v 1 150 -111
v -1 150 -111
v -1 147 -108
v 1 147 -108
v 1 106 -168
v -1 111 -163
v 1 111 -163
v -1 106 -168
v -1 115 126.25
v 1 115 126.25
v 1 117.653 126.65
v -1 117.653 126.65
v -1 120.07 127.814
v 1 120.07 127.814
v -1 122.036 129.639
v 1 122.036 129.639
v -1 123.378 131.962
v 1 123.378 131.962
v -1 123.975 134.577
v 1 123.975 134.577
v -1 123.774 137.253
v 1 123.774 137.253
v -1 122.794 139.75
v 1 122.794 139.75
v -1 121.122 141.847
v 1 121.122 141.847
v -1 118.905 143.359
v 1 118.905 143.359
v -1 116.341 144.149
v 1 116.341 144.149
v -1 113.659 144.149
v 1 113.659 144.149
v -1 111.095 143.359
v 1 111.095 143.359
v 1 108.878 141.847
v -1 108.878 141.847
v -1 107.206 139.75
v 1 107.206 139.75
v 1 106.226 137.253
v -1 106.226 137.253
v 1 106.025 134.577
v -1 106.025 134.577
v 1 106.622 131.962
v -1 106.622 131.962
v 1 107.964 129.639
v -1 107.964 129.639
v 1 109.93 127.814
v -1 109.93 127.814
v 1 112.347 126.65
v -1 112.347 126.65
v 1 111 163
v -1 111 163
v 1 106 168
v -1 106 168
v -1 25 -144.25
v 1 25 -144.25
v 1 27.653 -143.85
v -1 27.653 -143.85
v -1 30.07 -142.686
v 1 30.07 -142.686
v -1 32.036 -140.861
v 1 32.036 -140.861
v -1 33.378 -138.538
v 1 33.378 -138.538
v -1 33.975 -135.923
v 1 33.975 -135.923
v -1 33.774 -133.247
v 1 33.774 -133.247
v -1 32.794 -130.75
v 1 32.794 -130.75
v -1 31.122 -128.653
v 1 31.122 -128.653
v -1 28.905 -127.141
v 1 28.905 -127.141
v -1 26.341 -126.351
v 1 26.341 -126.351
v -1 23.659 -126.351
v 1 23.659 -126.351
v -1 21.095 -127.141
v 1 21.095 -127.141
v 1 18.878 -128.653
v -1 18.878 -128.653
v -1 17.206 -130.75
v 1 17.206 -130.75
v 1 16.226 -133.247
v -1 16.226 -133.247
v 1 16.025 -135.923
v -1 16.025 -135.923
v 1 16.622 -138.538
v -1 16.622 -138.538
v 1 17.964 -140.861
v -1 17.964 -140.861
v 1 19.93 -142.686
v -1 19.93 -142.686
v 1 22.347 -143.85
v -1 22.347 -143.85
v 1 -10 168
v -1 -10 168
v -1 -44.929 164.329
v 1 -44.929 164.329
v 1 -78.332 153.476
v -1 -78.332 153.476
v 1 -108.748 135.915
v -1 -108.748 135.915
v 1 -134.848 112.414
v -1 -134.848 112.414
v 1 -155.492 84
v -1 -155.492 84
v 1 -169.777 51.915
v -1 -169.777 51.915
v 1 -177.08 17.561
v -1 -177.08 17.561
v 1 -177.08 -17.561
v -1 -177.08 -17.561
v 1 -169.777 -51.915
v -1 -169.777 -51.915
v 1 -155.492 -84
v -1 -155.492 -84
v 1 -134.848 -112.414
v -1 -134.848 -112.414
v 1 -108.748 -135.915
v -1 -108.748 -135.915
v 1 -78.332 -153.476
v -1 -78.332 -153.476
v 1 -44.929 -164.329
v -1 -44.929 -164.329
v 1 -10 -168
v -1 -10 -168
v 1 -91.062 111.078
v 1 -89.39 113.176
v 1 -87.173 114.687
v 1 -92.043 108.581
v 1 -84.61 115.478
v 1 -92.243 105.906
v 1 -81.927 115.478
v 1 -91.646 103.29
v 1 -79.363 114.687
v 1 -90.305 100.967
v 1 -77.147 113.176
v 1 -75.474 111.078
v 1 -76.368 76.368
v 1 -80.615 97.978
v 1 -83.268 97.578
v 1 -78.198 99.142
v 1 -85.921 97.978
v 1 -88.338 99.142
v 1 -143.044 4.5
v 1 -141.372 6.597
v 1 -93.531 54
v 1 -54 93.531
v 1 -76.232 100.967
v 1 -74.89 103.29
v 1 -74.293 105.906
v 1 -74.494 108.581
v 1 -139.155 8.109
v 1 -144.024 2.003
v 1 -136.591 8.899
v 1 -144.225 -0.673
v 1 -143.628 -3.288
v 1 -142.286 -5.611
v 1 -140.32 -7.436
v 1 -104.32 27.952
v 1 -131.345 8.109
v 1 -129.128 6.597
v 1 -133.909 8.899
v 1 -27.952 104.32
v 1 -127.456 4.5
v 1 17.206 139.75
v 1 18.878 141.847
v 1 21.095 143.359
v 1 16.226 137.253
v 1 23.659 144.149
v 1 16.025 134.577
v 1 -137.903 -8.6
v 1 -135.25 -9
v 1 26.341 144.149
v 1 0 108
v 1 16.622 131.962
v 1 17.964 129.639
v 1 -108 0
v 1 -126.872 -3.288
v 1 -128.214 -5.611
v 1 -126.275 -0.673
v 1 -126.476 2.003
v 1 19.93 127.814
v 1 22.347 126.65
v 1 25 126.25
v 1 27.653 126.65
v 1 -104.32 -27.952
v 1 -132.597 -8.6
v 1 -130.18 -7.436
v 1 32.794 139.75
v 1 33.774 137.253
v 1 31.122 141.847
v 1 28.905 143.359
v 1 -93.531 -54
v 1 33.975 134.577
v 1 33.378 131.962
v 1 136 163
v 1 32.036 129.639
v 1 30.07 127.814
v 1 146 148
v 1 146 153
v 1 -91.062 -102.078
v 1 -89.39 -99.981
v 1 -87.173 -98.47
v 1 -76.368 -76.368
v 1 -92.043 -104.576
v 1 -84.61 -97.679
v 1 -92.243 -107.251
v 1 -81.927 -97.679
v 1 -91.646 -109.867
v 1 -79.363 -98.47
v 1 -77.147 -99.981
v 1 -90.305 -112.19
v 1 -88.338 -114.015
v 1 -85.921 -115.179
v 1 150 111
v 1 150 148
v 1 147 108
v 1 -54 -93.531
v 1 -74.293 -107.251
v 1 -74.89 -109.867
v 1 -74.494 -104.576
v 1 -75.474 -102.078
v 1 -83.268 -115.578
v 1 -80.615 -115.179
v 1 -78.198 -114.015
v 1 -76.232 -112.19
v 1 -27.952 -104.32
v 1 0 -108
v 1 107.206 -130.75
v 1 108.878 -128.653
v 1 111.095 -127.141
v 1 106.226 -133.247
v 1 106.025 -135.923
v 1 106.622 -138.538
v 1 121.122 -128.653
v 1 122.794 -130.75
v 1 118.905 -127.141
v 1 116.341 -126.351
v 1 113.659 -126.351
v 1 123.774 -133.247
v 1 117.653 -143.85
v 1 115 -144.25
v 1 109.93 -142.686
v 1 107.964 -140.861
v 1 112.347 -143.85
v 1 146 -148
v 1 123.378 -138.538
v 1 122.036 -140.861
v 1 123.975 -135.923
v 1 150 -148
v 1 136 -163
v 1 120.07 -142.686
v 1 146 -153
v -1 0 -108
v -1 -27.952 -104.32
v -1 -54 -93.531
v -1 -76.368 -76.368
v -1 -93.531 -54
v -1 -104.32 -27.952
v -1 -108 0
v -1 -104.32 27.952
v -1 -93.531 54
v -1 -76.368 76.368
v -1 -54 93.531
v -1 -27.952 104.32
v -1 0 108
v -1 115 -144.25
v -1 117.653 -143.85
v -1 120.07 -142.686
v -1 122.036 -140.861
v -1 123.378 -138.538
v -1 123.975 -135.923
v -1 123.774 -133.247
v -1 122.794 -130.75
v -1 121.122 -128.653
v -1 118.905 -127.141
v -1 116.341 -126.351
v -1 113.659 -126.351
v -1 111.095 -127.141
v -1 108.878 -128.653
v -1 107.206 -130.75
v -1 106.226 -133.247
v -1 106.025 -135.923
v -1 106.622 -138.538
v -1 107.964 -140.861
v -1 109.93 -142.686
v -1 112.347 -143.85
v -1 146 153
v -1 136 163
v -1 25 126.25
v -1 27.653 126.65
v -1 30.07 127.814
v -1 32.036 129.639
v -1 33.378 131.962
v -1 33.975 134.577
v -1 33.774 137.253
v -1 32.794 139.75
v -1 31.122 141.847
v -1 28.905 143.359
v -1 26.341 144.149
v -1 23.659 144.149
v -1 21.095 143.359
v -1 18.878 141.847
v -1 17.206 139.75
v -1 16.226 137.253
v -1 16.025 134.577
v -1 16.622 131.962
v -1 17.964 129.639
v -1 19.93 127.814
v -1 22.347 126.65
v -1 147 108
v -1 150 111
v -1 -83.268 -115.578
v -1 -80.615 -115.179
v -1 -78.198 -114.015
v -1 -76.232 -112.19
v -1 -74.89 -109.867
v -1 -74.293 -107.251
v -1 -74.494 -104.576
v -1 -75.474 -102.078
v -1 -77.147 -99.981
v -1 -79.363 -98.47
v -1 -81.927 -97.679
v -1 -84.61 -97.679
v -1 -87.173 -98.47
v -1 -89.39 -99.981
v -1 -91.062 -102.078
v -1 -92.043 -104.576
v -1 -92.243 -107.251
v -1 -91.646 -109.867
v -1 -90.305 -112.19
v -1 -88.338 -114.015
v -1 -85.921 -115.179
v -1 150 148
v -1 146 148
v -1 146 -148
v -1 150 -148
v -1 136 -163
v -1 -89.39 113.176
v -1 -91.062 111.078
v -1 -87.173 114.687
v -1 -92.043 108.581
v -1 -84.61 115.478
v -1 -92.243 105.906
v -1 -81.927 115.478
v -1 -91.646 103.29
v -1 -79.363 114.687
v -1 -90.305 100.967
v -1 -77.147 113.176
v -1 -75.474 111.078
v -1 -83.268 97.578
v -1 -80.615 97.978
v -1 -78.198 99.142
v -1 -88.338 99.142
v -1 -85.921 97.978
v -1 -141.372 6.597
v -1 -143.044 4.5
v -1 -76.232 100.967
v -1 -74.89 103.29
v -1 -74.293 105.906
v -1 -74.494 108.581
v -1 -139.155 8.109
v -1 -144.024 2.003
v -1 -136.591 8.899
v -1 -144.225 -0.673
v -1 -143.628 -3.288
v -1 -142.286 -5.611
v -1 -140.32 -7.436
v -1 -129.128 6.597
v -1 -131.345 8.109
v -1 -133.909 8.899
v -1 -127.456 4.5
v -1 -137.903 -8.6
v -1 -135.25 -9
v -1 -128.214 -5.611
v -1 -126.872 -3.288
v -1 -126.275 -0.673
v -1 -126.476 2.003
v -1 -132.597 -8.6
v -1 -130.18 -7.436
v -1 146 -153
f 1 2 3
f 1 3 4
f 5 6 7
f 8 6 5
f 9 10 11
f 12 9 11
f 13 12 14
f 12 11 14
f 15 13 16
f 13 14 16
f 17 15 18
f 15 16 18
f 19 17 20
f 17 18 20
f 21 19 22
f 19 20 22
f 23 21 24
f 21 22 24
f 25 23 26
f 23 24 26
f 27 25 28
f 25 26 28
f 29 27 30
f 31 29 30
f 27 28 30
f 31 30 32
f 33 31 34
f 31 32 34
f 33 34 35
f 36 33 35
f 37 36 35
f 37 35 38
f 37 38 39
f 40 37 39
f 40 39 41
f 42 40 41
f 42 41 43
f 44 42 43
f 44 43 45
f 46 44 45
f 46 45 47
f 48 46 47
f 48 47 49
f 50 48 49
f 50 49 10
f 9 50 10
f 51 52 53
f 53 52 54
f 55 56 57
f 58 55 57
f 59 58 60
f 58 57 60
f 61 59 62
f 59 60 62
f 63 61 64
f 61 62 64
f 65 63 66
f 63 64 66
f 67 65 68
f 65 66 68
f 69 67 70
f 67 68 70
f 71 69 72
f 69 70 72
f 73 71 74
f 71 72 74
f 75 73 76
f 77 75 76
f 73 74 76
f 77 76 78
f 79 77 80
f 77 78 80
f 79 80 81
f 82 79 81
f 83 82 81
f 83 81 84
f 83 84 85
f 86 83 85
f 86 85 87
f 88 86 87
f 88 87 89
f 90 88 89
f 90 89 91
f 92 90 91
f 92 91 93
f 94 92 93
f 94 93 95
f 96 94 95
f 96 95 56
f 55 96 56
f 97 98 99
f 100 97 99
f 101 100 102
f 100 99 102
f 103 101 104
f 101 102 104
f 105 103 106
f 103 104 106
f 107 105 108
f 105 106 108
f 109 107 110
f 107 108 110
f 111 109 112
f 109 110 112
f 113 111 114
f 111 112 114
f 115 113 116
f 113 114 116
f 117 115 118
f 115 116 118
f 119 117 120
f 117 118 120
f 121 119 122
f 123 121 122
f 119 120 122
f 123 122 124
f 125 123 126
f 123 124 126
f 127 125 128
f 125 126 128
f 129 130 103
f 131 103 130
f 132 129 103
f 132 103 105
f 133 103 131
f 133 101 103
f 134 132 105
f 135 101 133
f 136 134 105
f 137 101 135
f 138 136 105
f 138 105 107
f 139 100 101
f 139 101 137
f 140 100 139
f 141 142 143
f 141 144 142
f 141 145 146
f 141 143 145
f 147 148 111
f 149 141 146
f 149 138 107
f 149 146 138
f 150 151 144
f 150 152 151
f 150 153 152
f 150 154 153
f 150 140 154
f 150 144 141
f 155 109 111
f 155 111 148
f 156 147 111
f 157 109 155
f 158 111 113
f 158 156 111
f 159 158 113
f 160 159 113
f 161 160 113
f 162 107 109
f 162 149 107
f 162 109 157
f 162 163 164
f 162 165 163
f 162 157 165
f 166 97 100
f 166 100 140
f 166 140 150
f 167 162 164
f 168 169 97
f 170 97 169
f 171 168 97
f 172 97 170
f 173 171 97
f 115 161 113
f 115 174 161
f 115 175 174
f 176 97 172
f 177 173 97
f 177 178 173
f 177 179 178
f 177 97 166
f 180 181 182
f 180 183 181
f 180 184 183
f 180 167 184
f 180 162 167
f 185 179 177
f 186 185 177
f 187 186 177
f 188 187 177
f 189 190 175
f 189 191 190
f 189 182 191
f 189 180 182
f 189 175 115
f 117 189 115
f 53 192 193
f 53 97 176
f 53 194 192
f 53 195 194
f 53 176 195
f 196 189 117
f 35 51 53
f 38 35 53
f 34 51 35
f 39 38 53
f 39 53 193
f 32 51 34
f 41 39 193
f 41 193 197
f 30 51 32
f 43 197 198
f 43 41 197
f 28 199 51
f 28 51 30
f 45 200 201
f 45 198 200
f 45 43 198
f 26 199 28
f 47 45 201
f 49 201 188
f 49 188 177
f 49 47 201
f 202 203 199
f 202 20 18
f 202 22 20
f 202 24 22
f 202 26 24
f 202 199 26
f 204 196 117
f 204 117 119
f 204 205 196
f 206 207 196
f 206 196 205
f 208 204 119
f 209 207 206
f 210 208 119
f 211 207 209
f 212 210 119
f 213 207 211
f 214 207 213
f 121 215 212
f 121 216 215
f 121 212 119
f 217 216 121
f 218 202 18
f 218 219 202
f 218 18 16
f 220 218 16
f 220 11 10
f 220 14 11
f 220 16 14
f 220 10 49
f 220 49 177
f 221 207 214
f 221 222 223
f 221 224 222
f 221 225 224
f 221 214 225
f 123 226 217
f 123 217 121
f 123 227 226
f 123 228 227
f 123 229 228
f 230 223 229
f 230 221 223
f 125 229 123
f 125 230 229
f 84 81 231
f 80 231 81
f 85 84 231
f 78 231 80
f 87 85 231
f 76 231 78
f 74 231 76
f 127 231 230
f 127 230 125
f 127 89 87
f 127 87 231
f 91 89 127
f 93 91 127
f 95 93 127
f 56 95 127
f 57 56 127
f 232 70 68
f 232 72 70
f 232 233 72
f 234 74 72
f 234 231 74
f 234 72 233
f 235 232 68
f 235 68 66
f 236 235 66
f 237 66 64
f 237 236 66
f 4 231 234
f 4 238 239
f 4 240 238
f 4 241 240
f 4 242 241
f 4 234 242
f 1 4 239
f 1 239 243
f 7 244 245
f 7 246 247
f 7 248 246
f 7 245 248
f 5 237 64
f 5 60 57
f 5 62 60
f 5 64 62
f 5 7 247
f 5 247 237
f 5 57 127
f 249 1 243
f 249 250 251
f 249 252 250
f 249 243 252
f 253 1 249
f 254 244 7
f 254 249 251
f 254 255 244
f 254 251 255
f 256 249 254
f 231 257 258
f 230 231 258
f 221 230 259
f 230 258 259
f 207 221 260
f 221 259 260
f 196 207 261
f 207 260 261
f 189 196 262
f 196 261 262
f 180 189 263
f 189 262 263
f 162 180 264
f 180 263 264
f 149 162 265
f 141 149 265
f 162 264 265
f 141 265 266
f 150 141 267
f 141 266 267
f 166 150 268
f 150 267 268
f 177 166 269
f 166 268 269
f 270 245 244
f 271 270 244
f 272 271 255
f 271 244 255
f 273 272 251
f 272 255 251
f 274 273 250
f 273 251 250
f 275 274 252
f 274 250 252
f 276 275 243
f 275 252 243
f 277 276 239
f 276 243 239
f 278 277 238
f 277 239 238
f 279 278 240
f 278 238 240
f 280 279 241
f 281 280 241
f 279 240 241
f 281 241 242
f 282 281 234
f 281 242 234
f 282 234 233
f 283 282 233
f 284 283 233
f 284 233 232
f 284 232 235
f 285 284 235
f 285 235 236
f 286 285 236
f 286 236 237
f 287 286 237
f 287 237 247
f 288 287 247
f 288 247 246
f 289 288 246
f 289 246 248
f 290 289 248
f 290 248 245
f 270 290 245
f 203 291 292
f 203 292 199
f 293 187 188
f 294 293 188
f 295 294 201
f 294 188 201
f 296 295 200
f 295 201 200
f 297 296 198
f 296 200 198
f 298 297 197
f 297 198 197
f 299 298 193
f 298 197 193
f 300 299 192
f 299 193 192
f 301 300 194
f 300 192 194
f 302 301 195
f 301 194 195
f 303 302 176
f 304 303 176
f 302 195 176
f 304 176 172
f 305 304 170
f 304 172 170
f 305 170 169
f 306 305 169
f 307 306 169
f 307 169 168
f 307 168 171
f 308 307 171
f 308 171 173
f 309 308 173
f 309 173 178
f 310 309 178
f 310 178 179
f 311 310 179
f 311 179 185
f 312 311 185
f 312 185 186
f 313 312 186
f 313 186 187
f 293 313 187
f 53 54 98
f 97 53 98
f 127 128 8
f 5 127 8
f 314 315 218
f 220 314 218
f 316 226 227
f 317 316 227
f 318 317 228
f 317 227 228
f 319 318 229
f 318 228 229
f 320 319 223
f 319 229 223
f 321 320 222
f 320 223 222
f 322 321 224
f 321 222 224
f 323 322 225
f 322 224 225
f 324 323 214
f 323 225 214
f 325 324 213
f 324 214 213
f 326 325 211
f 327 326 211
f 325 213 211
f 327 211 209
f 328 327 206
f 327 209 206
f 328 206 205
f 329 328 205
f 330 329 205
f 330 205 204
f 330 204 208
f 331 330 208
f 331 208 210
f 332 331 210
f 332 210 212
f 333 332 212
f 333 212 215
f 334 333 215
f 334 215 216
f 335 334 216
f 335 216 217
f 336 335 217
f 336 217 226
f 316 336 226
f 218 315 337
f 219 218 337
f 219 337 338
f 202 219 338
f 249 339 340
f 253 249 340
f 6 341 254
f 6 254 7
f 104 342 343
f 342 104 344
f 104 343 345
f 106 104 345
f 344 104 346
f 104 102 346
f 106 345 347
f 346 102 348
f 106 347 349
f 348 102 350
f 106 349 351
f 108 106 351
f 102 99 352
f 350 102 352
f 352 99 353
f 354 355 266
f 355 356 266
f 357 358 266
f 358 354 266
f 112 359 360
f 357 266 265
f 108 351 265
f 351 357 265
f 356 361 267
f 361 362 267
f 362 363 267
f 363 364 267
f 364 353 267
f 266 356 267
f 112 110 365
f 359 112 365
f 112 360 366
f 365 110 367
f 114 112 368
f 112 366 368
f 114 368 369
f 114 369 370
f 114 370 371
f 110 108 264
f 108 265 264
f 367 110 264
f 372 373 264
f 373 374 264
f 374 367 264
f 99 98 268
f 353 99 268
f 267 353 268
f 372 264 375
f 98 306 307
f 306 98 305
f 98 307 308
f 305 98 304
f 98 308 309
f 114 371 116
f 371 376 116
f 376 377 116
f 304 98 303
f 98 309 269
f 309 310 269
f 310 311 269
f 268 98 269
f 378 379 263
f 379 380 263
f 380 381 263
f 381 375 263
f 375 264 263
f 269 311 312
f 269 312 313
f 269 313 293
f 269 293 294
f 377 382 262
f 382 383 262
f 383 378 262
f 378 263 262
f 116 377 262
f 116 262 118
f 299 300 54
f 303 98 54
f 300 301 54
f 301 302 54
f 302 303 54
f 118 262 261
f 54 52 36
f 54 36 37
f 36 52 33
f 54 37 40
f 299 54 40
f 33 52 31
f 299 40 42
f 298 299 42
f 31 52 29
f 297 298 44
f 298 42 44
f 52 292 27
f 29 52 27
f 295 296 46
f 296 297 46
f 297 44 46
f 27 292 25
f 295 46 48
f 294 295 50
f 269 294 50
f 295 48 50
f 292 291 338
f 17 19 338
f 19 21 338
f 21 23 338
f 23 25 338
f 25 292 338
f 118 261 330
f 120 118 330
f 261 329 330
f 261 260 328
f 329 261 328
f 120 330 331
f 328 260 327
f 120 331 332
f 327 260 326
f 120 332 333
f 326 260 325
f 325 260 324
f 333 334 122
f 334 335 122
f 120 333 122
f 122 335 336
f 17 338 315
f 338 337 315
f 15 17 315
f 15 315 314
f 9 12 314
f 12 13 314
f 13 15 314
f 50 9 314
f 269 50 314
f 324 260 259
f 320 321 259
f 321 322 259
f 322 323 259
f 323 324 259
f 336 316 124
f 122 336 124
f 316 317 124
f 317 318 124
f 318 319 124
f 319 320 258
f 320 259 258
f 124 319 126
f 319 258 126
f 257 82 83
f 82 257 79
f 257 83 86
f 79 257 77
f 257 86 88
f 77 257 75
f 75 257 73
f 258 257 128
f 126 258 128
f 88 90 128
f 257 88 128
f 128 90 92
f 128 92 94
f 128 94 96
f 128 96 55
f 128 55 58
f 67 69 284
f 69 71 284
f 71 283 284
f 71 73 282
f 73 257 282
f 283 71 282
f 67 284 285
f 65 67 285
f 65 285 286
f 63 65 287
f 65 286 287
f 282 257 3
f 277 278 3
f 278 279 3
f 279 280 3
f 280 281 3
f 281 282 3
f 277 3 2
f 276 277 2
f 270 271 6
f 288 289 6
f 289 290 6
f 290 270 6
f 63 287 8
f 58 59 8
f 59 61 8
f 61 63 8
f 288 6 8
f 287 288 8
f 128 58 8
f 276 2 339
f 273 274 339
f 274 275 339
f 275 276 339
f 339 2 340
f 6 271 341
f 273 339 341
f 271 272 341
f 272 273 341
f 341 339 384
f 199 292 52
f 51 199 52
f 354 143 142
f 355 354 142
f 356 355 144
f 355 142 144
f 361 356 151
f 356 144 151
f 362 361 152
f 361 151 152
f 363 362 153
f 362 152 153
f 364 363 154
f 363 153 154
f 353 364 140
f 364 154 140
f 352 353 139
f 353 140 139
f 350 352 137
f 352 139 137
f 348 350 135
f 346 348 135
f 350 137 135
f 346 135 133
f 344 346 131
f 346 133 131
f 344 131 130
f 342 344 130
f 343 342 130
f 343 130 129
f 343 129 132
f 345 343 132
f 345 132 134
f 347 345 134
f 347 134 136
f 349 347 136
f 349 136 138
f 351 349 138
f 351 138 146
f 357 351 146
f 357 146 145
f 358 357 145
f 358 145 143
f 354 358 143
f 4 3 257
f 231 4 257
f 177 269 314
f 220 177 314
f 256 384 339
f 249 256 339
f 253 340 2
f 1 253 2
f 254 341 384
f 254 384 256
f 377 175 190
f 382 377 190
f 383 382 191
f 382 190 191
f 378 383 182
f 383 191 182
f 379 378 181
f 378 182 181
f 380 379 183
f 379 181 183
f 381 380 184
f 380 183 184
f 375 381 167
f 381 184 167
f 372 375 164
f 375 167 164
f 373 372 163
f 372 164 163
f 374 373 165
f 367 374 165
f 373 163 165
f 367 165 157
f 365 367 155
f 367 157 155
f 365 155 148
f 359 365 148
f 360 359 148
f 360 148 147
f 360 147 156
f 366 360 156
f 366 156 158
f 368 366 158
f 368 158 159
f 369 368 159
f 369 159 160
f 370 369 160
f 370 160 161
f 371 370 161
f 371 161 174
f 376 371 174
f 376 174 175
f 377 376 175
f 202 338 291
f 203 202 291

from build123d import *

# Parameters (mm, degrees)
SM_START                 = -1
SM_BASE_FLANGE_1_DEPTH   = 2
SKETCH_6_R               = 9
SKETCH_6_R_2             = 68.5
CUT_EXTRUDE_1_DEPTH      = 245.769279118
CUT_EXTRUDE_2_DEPTH      = 245.763150821
CUT_EXTRUDE_2_DEPTH_BACK = 245.763150821
CHAMFER_3_SIZE           = 10
CHAMFER_4_SIZE           = 3


# Read off the part's stored shape, not the designer's step: Базовая кромка1
with BuildPart() as part:
    # Базовая кромка1 outline → Базовая кромка1 (new body)
    with BuildSketch(Plane(origin=(0, 0, 0), x_dir=(0, 0, -1), z_dir=(1, 0, 0)).offset(SM_START)):
        with BuildLine():
            ThreePointArc((108, 0), (0, -108), (-108, 0))
            Line((-108, 0), (-108, 150))
            Line((-108, 150), (-148, 150))
            Line((-148, 150), (-148, 146))
            Line((-148, 146), (-168, 146))
            Line((-168, 146), (-168, -10))
            ThreePointArc((-168, -10), (0, -178), (168, -10))
            Line((168, -10), (168, 146))
            Line((168, 146), (148, 146))
            Line((148, 146), (148, 150))
            Line((148, 150), (108, 150))
            Line((108, 150), (108, 0))
        make_face()
    extrude(amount=SM_BASE_FLANGE_1_DEPTH)

    # Эскиз6 → Вырез-Вытянуть1 (cut, through all)
    with BuildSketch(Plane(origin=(1, 0, 0), x_dir=(0, 0, -1), z_dir=(1, 0, 0))):
        with Locations((-135.25, 115)):
            Circle(SKETCH_6_R)
        with Locations((-106.578454425, -83.268214538)):
            Circle(SKETCH_6_R)
        with Locations((0, -135.25)):
            Circle(SKETCH_6_R)
        with Locations((106.578454425, -83.268214538)):
            Circle(SKETCH_6_R)
        with Locations((135.25, 115)):
            Circle(SKETCH_6_R)
        Circle(SKETCH_6_R_2)
        with Locations((-135.25, 25)):
            Circle(SKETCH_6_R)
        with Locations((135.25, 25)):
            Circle(SKETCH_6_R)
    extrude(amount=-CUT_EXTRUDE_1_DEPTH, mode=Mode.SUBTRACT)

    # Эскиз7 → Вырез-Вытянуть2 (cut, two sides: drawn at the far end of the back side and taken through both)
    with BuildSketch(Plane(origin=(0, 0, 0), x_dir=(0, 0, -1), z_dir=(1, 0, 0)).offset(-CUT_EXTRUDE_2_DEPTH_BACK)):
        Polygon((-163, 111), (-168, 106), (-168, 111), (-168, 146), (-163, 146), align=None)
        Polygon((168, 146), (163, 146), (163, 111), (168, 106), (168, 111), align=None)
    extrude(amount=CUT_EXTRUDE_2_DEPTH + CUT_EXTRUDE_2_DEPTH_BACK, mode=Mode.SUBTRACT)

    # Фаска3
    chamfer_3_edges = [part.edges().sort_by_distance(p)[0] for p in [
        (0, 146, 163),
        (0, 146, -163),
    ]]
    chamfer(chamfer_3_edges, length=CHAMFER_3_SIZE)

    # Фаска4
    chamfer_4_edges = [part.edges().sort_by_distance(p)[0] for p in [
        (0, 150, -108),
        (0, 150, 108),
    ]]
    chamfer(chamfer_4_edges, length=CHAMFER_4_SIZE)


solid = part.part
